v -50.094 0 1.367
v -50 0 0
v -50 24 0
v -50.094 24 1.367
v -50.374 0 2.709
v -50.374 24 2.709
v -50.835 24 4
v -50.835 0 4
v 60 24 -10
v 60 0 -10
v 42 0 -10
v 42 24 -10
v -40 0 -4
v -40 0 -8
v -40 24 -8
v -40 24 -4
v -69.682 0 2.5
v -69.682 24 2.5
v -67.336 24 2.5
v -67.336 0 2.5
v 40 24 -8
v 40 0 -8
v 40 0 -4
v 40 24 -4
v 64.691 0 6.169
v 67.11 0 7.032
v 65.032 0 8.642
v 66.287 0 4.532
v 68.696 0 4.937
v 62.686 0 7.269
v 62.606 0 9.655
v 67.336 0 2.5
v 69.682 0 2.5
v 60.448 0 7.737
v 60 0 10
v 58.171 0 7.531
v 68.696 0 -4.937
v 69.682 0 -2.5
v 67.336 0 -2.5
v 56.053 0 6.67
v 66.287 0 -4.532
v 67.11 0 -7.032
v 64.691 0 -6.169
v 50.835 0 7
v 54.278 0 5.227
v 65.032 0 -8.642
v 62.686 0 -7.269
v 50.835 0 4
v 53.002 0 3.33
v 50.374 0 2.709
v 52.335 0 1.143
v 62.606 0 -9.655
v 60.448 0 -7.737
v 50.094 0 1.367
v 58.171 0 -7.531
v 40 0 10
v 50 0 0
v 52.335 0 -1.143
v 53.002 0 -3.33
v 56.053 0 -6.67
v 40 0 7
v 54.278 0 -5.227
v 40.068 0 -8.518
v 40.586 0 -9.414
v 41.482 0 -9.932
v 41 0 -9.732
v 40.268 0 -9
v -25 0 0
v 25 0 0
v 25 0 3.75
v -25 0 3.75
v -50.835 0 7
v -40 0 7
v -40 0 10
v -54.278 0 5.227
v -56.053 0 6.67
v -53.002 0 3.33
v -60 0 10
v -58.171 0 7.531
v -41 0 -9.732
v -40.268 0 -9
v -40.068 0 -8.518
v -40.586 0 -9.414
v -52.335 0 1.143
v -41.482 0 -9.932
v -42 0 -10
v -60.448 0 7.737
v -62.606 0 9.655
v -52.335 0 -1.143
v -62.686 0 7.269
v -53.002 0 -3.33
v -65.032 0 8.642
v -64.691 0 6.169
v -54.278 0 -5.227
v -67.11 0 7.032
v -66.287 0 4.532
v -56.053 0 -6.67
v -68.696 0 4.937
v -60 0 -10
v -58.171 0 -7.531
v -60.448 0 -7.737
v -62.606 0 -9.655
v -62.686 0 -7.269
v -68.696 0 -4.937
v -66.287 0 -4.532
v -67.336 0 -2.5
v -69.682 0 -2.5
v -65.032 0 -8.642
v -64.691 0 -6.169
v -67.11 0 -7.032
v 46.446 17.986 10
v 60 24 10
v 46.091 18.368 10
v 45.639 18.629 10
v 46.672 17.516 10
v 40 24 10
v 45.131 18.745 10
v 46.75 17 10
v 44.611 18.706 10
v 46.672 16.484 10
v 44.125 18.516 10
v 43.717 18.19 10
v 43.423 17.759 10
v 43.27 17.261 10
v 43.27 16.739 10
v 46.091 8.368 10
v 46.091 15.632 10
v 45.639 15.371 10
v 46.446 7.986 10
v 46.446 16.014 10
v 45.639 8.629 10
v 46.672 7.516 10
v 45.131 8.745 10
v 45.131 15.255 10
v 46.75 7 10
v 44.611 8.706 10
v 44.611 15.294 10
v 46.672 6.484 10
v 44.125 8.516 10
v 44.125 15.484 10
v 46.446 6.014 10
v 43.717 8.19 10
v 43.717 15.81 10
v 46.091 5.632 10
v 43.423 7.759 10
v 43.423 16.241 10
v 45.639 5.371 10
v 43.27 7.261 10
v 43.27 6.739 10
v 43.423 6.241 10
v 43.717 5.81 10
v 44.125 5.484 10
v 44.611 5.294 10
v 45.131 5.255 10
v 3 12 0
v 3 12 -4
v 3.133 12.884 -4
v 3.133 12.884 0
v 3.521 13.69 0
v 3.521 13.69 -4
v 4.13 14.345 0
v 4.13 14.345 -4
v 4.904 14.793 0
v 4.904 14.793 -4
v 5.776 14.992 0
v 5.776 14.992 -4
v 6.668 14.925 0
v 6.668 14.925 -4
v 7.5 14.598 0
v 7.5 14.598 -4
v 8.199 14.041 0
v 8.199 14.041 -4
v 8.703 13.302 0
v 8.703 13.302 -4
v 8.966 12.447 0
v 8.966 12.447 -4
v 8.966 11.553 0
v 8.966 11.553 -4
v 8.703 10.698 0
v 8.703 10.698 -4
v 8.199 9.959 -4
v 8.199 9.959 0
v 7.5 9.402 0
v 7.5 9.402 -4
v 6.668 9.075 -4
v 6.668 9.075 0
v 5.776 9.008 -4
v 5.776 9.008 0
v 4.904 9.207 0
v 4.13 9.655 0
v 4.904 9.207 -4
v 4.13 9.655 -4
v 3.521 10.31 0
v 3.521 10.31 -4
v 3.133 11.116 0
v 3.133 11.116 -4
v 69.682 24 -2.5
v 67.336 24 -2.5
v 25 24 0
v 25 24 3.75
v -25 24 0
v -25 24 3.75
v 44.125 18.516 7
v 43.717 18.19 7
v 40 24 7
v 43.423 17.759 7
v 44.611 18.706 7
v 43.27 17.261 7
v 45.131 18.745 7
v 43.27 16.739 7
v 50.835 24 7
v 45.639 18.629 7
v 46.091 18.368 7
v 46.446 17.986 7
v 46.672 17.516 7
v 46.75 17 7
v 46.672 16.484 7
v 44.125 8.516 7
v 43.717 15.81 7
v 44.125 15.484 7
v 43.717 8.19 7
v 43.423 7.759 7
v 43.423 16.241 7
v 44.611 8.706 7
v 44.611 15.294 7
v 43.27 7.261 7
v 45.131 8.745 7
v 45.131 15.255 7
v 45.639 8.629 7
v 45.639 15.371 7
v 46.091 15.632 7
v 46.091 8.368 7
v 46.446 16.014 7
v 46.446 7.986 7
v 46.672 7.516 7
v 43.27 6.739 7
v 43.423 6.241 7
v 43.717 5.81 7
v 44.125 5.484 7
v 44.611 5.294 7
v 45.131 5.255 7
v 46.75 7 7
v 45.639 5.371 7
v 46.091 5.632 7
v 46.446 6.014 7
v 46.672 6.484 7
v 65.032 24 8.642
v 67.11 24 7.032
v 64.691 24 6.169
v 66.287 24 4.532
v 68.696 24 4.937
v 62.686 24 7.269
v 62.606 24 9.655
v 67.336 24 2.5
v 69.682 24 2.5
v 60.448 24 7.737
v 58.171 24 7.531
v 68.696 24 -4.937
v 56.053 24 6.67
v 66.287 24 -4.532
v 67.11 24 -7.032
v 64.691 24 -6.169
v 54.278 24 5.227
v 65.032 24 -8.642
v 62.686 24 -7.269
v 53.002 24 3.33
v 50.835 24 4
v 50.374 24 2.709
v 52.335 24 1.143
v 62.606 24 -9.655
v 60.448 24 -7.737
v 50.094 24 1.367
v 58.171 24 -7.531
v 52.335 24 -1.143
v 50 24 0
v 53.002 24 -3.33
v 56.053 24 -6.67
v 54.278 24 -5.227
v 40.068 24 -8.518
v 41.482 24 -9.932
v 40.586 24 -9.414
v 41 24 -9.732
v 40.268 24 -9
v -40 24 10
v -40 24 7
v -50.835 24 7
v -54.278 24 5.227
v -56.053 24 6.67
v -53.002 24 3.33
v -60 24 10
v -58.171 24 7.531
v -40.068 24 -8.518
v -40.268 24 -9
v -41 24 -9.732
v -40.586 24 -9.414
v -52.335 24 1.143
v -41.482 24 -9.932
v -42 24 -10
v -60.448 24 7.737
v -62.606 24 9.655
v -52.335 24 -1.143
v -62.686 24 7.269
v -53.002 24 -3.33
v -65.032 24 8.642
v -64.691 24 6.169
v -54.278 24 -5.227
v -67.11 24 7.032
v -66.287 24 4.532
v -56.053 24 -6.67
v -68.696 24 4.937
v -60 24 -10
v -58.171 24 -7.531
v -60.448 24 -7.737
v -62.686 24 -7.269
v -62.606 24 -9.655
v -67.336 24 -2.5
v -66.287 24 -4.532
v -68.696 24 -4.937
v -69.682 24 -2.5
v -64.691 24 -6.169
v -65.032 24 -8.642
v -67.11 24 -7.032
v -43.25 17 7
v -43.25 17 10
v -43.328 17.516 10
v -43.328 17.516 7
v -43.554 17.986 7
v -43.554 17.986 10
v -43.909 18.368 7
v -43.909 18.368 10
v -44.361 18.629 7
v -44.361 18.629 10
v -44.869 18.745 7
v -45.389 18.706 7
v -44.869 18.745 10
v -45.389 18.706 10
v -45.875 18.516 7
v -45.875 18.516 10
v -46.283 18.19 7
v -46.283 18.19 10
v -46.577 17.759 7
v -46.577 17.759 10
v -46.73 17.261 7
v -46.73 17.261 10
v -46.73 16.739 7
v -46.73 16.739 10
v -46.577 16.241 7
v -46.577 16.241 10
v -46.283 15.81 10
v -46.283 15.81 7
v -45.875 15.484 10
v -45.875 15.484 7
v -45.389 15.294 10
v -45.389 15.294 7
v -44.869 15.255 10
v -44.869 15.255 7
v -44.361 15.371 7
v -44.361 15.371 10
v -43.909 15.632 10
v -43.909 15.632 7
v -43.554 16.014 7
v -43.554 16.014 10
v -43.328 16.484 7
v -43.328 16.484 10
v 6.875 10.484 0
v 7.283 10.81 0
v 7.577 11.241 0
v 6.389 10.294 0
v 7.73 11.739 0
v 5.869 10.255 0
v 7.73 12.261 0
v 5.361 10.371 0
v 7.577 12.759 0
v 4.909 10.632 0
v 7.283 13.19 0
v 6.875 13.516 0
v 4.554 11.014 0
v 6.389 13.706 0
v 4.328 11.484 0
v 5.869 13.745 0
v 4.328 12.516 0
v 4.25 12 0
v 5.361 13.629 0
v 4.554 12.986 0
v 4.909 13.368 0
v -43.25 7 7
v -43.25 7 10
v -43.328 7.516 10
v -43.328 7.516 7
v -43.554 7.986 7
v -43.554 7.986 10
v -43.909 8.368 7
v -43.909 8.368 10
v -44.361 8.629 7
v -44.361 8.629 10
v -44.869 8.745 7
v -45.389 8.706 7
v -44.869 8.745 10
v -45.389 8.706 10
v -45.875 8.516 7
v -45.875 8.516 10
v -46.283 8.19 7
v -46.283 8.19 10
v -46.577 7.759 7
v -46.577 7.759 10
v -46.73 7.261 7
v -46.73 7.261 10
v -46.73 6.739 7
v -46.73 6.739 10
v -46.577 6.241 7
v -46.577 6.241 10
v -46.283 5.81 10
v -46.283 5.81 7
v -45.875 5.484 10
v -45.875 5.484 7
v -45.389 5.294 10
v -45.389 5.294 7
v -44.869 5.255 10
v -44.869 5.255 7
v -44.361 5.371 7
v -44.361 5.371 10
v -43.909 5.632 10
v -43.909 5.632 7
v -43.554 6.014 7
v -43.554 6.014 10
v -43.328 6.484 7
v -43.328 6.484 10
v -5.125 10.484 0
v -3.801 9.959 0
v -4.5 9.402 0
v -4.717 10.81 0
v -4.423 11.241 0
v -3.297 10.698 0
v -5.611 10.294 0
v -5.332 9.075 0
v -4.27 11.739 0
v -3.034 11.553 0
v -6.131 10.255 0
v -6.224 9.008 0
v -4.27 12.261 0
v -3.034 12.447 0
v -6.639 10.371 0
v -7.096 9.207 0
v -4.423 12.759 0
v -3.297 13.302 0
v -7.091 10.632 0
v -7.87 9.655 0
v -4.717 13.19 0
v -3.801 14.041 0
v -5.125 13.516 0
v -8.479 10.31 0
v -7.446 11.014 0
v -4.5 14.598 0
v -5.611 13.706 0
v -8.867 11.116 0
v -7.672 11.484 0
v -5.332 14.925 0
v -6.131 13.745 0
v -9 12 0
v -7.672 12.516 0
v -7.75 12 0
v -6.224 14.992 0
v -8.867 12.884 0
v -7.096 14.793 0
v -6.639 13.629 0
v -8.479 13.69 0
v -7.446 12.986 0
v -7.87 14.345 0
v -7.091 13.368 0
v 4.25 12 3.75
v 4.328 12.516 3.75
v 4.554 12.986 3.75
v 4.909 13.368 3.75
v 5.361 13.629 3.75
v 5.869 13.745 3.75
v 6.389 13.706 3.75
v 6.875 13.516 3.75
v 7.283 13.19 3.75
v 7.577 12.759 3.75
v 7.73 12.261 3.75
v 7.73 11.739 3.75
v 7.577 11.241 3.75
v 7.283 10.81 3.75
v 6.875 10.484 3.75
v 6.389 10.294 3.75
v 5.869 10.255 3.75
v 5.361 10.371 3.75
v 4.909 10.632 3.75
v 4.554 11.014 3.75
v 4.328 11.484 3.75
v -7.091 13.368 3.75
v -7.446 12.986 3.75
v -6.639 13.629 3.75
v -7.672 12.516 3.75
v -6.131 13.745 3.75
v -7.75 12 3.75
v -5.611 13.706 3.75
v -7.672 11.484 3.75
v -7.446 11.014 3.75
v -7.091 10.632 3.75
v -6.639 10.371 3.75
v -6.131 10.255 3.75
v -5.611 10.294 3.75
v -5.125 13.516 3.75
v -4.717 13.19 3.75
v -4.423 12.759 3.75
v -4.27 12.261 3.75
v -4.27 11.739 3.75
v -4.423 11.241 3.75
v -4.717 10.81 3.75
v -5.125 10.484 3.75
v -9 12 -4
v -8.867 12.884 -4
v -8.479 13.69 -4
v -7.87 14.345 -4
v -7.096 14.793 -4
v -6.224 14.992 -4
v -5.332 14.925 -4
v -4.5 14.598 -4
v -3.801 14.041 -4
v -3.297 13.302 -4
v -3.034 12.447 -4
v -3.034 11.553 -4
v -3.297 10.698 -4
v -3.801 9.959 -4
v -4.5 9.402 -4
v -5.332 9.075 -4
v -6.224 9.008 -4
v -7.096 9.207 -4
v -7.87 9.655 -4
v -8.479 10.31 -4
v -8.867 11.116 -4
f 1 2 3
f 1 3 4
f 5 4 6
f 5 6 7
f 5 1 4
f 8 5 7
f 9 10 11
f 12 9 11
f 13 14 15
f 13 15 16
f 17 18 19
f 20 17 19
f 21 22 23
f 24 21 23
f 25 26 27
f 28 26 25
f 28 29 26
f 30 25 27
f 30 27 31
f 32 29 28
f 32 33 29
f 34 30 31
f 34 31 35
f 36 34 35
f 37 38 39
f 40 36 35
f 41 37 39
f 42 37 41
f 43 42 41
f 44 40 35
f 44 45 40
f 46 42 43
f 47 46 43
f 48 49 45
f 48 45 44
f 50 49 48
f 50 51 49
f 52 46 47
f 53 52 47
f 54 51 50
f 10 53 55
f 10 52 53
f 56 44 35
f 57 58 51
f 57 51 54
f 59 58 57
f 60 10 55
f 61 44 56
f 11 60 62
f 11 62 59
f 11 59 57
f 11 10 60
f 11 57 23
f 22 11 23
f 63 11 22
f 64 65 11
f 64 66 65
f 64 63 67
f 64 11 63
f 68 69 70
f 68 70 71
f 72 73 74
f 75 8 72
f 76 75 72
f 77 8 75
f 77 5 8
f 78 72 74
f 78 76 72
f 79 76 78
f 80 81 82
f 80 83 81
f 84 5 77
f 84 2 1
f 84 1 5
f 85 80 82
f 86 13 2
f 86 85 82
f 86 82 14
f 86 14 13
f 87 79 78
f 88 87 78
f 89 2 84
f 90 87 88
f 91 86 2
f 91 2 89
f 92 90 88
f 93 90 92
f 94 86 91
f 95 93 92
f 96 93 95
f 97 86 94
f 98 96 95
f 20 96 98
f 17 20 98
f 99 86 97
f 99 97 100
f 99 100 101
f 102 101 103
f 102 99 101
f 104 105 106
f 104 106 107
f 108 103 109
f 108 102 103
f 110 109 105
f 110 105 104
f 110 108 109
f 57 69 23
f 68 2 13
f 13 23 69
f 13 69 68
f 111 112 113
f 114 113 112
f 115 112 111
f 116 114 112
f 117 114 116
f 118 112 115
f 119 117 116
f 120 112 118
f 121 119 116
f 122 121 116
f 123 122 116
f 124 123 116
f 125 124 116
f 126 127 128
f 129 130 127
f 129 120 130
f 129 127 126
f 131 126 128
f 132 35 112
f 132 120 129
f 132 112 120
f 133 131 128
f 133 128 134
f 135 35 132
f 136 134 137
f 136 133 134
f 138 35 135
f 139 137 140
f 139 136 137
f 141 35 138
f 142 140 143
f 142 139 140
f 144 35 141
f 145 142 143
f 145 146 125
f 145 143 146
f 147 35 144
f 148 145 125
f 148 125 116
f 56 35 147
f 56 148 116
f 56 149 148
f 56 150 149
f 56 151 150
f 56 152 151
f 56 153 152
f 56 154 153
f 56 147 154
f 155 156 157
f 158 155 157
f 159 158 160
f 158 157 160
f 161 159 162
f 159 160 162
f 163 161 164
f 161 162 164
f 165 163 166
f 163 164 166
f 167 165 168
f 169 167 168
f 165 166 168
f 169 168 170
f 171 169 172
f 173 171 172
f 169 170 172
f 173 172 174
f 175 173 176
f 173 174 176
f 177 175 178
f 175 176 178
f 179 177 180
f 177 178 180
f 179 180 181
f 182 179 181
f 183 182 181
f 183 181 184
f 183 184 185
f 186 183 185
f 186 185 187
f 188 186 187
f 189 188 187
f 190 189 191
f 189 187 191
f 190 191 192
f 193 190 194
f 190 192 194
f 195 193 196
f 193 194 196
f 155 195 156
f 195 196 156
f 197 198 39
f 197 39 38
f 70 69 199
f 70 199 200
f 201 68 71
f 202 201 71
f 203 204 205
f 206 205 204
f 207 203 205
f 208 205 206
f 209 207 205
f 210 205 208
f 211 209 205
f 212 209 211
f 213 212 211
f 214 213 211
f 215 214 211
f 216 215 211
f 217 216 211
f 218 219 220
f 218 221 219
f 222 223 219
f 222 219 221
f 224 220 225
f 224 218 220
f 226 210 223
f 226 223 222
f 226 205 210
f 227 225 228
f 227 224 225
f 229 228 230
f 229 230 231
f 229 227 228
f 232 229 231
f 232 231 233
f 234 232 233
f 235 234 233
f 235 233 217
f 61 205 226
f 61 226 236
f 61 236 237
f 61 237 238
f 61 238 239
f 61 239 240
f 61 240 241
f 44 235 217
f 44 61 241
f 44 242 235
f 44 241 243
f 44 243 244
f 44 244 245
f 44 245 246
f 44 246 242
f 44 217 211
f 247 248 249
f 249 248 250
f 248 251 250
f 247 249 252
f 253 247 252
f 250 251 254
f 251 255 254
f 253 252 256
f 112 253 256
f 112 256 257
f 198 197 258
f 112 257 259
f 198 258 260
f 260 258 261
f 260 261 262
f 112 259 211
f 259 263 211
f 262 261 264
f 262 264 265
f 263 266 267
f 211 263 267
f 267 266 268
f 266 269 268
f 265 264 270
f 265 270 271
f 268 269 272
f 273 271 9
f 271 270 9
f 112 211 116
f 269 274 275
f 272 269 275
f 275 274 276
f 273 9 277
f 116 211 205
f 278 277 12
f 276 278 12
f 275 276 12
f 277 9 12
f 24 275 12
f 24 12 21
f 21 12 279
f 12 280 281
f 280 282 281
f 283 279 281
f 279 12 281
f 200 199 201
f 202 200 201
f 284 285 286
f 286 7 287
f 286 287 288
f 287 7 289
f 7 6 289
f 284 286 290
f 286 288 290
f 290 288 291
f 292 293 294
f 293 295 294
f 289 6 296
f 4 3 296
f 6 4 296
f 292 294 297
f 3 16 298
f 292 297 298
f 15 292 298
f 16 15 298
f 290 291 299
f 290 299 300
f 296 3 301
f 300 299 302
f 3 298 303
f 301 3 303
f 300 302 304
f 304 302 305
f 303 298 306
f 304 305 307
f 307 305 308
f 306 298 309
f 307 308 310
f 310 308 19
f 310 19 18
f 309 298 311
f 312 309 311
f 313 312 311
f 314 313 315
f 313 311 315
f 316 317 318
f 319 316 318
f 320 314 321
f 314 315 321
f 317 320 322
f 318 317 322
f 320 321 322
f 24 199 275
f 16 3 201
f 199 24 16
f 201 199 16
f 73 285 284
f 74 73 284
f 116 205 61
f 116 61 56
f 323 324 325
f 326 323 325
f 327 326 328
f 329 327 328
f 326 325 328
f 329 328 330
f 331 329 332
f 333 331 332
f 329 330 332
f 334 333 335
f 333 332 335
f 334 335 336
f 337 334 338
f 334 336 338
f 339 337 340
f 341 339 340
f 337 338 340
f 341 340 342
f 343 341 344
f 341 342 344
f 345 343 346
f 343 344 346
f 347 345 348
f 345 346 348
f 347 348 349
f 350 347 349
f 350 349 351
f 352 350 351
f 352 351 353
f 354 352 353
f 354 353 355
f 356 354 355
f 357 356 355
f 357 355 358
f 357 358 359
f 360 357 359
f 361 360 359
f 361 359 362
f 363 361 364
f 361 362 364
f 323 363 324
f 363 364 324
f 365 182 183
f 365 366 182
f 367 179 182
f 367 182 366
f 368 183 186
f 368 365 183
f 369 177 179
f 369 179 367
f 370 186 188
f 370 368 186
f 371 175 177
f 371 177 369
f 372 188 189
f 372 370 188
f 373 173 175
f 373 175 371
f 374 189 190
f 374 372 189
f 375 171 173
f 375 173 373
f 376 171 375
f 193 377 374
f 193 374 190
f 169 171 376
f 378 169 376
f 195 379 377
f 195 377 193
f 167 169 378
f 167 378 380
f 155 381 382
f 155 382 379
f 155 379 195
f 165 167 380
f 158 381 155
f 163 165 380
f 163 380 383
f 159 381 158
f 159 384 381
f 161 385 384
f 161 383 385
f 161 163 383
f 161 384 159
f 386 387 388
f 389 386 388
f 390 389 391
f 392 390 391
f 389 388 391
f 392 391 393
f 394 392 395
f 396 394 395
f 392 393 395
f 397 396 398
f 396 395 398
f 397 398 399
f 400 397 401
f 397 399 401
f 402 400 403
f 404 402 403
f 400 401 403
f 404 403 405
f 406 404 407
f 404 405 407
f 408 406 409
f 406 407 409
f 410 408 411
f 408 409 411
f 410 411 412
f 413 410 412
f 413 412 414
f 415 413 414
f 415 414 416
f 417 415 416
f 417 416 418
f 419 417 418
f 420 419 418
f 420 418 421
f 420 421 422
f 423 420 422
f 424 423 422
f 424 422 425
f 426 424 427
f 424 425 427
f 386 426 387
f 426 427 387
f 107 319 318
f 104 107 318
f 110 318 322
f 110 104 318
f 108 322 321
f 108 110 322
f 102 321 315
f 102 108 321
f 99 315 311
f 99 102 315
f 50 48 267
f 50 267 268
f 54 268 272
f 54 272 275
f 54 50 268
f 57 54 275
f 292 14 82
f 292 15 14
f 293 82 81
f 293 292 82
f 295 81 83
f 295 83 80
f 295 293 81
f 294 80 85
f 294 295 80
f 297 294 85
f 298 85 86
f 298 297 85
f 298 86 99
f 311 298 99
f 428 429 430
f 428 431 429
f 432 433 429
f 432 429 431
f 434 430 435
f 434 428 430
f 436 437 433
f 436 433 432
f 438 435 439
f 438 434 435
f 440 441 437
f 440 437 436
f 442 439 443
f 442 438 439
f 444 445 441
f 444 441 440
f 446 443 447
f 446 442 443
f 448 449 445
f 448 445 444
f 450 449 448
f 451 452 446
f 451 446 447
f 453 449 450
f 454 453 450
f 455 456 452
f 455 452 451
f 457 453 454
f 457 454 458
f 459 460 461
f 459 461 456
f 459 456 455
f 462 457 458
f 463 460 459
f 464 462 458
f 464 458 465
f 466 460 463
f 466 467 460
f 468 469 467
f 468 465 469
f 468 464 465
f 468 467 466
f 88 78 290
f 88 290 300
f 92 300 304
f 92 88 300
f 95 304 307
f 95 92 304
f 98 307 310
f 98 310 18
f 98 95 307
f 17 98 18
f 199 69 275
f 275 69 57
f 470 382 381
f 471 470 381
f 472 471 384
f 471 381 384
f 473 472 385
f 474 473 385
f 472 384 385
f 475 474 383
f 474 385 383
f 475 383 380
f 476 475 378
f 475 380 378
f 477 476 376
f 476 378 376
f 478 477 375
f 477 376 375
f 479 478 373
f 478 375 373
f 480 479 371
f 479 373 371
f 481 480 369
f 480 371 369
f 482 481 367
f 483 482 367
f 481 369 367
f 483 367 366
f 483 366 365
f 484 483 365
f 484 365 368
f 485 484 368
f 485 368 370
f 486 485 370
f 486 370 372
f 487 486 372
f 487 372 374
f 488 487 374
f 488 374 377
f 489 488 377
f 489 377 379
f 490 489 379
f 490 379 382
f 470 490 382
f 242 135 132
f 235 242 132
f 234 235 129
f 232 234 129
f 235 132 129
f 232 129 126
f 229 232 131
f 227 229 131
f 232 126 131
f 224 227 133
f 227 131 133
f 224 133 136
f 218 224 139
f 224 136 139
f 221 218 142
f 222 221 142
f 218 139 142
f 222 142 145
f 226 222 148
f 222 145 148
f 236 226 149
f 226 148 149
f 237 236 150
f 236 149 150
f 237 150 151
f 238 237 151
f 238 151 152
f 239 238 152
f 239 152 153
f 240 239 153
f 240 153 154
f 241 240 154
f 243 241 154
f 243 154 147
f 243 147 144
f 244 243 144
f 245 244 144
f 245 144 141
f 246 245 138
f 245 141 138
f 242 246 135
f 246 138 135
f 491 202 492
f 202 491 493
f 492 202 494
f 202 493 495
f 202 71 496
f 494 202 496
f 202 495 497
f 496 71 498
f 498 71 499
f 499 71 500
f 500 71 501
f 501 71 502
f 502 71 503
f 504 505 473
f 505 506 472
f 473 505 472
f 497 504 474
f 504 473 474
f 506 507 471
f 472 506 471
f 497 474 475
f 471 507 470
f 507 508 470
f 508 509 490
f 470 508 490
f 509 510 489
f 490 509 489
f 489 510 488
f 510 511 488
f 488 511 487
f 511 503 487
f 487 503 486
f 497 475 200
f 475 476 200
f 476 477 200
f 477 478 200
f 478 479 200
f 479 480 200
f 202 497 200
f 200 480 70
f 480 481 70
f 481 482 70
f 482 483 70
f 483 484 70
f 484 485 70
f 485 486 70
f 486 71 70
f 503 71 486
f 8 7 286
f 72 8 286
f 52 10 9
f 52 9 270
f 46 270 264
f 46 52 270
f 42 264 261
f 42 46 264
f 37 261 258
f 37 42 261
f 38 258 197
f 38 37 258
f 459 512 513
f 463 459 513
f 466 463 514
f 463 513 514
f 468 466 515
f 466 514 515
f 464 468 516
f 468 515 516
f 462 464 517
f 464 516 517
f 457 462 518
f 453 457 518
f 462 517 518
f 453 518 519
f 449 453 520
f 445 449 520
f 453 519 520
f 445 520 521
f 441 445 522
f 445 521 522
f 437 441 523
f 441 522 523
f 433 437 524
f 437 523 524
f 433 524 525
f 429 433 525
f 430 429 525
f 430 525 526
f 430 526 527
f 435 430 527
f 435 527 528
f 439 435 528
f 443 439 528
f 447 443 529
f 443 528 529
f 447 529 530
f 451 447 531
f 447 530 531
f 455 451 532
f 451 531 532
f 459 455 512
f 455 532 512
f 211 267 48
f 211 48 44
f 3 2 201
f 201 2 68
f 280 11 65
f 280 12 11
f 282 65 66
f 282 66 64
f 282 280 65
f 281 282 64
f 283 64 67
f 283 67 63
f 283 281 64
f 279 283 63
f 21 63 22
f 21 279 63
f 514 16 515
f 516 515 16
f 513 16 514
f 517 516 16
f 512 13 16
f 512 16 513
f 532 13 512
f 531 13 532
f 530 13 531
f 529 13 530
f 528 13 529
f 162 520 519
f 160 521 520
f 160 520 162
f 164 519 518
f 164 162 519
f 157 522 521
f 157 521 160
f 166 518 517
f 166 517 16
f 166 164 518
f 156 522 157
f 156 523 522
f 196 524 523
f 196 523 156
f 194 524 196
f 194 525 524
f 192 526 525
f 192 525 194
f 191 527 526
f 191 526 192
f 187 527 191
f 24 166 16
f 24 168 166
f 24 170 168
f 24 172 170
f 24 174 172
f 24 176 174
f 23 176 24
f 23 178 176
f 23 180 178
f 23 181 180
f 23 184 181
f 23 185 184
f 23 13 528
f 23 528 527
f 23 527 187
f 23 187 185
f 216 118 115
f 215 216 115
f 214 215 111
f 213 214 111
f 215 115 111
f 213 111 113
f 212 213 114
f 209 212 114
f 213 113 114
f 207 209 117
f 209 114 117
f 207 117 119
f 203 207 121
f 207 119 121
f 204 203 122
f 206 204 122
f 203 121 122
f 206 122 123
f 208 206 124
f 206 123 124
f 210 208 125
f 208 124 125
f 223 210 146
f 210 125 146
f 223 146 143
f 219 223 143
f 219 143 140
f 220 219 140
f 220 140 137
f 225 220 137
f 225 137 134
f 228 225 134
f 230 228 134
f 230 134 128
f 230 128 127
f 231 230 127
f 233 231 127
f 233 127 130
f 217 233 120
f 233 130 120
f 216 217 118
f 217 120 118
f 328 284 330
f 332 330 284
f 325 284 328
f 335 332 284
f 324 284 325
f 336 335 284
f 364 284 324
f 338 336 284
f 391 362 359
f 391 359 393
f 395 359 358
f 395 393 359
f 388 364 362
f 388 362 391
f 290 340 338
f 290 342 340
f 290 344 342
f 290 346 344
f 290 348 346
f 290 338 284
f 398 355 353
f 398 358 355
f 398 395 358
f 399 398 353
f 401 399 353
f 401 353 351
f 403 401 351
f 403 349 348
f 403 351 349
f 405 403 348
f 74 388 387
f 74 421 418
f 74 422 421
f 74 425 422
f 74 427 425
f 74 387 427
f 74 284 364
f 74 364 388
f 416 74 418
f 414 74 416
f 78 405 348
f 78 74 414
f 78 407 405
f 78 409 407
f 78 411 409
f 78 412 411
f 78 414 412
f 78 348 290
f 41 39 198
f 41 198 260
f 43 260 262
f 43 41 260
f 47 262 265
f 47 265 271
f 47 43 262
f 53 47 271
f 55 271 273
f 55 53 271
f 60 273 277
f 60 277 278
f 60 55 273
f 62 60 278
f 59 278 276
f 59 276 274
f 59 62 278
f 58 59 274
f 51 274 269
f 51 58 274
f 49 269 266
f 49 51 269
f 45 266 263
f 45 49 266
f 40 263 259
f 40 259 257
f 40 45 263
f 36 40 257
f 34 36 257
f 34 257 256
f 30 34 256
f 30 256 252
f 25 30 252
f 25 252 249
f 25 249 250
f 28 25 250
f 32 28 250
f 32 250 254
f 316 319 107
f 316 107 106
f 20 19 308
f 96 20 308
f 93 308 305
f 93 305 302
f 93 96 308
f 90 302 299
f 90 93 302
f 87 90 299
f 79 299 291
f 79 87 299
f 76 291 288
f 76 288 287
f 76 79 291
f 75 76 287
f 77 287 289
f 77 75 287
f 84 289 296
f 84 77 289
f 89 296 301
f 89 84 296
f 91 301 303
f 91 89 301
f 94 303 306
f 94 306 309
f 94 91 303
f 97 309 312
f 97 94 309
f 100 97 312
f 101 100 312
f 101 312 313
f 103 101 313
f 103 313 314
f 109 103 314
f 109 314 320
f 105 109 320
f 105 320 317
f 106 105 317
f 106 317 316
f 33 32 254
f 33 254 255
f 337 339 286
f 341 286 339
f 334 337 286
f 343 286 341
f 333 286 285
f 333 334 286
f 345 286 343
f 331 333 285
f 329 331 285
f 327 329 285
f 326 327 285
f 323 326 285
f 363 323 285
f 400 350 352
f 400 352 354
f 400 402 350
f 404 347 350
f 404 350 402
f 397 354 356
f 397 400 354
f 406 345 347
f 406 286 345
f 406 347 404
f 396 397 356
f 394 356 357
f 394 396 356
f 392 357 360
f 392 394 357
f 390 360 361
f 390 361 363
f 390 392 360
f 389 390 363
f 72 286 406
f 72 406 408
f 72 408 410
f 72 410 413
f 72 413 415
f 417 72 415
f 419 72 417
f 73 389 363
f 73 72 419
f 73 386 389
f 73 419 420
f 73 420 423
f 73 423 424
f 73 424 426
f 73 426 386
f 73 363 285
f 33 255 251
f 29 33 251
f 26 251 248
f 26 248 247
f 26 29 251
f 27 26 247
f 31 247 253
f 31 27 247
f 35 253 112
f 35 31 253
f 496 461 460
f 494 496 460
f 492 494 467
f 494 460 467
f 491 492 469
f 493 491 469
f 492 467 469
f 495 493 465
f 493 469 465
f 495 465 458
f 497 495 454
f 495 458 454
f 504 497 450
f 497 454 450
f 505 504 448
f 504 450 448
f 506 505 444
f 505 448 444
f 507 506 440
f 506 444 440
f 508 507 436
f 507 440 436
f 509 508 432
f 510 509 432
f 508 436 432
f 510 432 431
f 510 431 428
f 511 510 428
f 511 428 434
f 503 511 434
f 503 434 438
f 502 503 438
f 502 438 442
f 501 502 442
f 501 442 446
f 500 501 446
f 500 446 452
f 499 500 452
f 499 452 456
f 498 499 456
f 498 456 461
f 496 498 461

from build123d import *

# Parameters (mm, degrees)
SKETCH_1_R          = 7.75
EXTRUDE_1_DEPTH     = 24
EXTRUDE_START       = -24
EXTRUDE_2_DEPTH     = 24
SKETCH_3_W          = 50
SKETCH_3_H          = 3.75
EXTRUDE_3_DEPTH     = 24
SKETCH_4_W          = 80
SKETCH_4_H          = 6
CUT_EXTRUDE_1_DEPTH = 24
FILLET_1_R          = 2
SKETCH_5_W          = 7.752834923
SKETCH_5_H          = 5
CUT_EXTRUDE_2_DEPTH = 24
SKETCH_6_R          = 1.75
CUT_EXTRUDE_3_DEPTH = 24
SKETCH_7_R          = 1.75
CUT_EXTRUDE_4_DEPTH = 3
SKETCH_8_W          = 10.83484861
SKETCH_8_H          = 3
CUT_EXTRUDE_5_DEPTH = 75.375029438
SKETCH_9_R          = 1.75
CUT_EXTRUDE_6_DEPTH = 3
SKETCH_10_R         = 3
CUT_EXTRUDE_7_DEPTH = 4


with BuildPart() as part:
    # 草图1 → 凸台-拉伸1 (new body)
    with BuildSketch(Plane(origin=(0, 0, 0), x_dir=(1, 0, 0), z_dir=(0, 1, 0))):
        with BuildLine():
            Line((-50.83484861, -4), (50.83484861, -4))
            ThreePointArc((50.83484861, -4), (65.477225575, 8.366600265), (60, -10))
            Line((60, -10), (-60, -10))
            ThreePointArc((-60, -10), (-65.477225575, 8.366600265), (-50.83484861, -4))
        make_face()
        with Locations(Location((-60, 0, 0), (0, 0, 270))):
            Circle(SKETCH_1_R, mode=Mode.SUBTRACT)
        with Locations(Location((60, 0, 0), (0, 0, 270))):
            Circle(SKETCH_1_R, mode=Mode.SUBTRACT)
    extrude(amount=EXTRUDE_1_DEPTH)

    # 草图2 → 凸台-拉伸2 (add)
    with BuildSketch(Plane(origin=(0, 24, 0), x_dir=(1, 0, 0), z_dir=(0, 1, 0)).offset(EXTRUDE_START)):
        with BuildLine():
            ThreePointArc((-60, 10), (-52.928932188, 7.071067812), (-50, 0))
            Line((-50, 0), (50, 0))
            ThreePointArc((50, 0), (52.928932188, 7.071067812), (60, 10))
            Line((60, 10), (-60, 10))
        make_face()
    extrude(amount=EXTRUDE_2_DEPTH)

    # 草图3 → 凸台-拉伸3 (add)
    with BuildSketch(Plane.XZ):
        with Locations((0, 1.875)):
            Rectangle(SKETCH_3_W, SKETCH_3_H)
    extrude(amount=-EXTRUDE_3_DEPTH)

    # 草图4 → 切除-拉伸1 (cut)
    with BuildSketch(Plane.XZ):
        with Locations((0, 7)):
            Rectangle(SKETCH_4_W, SKETCH_4_H)
        with Locations((0, -7)):
            Rectangle(SKETCH_4_W, SKETCH_4_H)
    extrude(amount=-CUT_EXTRUDE_1_DEPTH, mode=Mode.SUBTRACT)

    # 圆角1
    fillet_1_edges = [part.edges().sort_by_distance(p)[0] for p in [
        (40, 12, -10),
        (-40, 12, -10),
    ]]
    fillet(fillet_1_edges, radius=FILLET_1_R)

    # 草图5 → 切除-拉伸2 (cut)
    with BuildSketch(Plane.XZ):
        with Locations((68.12542242, 0)):
            Rectangle(SKETCH_5_W, SKETCH_5_H)
        with Locations((-68.12542242, 0)):
            Rectangle(SKETCH_5_W, SKETCH_5_H)
    extrude(amount=-CUT_EXTRUDE_2_DEPTH, mode=Mode.SUBTRACT)

    # 草图6 → 切除-拉伸3 (cut)
    with BuildSketch(Plane(origin=(0, 0, -4), x_dir=(-1, 0, 0), z_dir=(0, 0, -1))):
        with Locations((-6, 12)):
            Circle(SKETCH_6_R)
        with Locations((6, 12)):
            Circle(SKETCH_6_R)
    extrude(amount=-CUT_EXTRUDE_3_DEPTH, mode=Mode.SUBTRACT)

    # 草图7 → 切除-拉伸4 (cut)
    with BuildSketch(Plane.XY.offset(10)):
        with Locations((45, 7)):
            Circle(SKETCH_7_R)
        with Locations((45, 17)):
            Circle(SKETCH_7_R)
    extrude(amount=-CUT_EXTRUDE_4_DEPTH, mode=Mode.SUBTRACT)

    # 草图8 → 切除-拉伸5 (cut, through all)
    with BuildSketch(Plane.XZ):
        with Locations((45.417424305, 5.5)):
            Rectangle(SKETCH_8_W, SKETCH_8_H)
        with Locations((-45.417424305, 5.5)):
            Rectangle(SKETCH_8_W, SKETCH_8_H)
    extrude(amount=-CUT_EXTRUDE_5_DEPTH, mode=Mode.SUBTRACT)

    # 草图9 → 切除-拉伸6 (cut)
    with BuildSketch(Plane.XY.offset(10)):
        with Locations((-45, 7)):
            Circle(SKETCH_9_R)
        with Locations((-45, 17)):
            Circle(SKETCH_9_R)
    extrude(amount=-CUT_EXTRUDE_6_DEPTH, mode=Mode.SUBTRACT)

    # 草图10 → 切除-拉伸7 (cut)
    with BuildSketch(Plane(origin=(0, 0, -4), x_dir=(-1, 0, 0), z_dir=(0, 0, -1))):
        with Locations((6, 12)):
            Circle(SKETCH_10_R)
        with Locations((-6, 12)):
            Circle(SKETCH_10_R)
    extrude(amount=-CUT_EXTRUDE_7_DEPTH, mode=Mode.SUBTRACT)


solid = part.part
